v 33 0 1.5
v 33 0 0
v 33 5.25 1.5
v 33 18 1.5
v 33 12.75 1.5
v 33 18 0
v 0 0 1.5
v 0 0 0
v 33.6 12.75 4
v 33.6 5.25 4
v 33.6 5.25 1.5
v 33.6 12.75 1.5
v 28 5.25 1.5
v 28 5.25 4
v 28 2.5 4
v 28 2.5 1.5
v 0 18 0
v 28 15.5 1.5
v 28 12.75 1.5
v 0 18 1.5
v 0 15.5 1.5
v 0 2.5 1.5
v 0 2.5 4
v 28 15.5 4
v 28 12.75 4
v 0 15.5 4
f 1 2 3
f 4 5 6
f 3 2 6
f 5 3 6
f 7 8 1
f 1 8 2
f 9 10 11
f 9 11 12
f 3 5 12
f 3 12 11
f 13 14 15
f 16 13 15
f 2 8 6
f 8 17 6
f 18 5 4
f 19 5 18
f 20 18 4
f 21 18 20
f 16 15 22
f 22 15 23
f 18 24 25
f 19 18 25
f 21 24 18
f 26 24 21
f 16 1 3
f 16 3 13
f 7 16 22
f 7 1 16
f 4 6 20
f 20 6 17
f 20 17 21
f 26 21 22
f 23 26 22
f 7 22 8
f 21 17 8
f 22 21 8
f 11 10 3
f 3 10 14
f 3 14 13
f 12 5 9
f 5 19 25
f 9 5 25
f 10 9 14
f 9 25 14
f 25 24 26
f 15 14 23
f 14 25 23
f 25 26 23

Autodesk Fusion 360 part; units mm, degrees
sketch "スケッチ1" plane through (0, 0, 0) normal (0, 0, 1) x (1, 0, 0)
  line L0 (0, 0) -> (33, 0)
  line L1 (33, 0) -> (33, 18)
  line L2 (33, 18) -> (0, 18)
  line L3 (0, 18) -> (0, 0)
  dimension "d1" = 33
  dimension "d2" = 18
extrude "押し出し1" add sketch "スケッチ1" along normal blind 4
sketch "スケッチ2" plane through (0, 0, 4) normal (0, 0, 1) x (-1, 0, 0)
  line L0 (0, -18) -> (0, 0)
  line L1 (0, 0) -> (-33, 0)
  line L2 (-33, 0) -> (-33, -18)
  line L3 (-33, -18) -> (0, -18)
  line L4 (-33, -18) -> (-28, -18)
  line L5 (-28, -18) -> (-28, 0)
  line L6 (-28, 0) -> (-33, 0)
  line L7 (-33, 0) -> (-33, -18)
  line L8 (-28, -12.75) -> (-33, -12.75)
  line L9 (-33, -12.75) -> (-33, -5.25)
  line L10 (-33, -5.25) -> (-28, -5.25)
  line L11 (-28, -5.25) -> (-28, -12.75)
  line L12 (-31.75, -9) -> (-34.25, -9) construction
  line L13 (-34.25, -9) -> (-31.75, -9) construction
  line L14 (0, 0) -> (-28, 0)
  line L15 (-28, 0) -> (-28, -2.5)
  line L16 (-28, -2.5) -> (0, -2.5)
  line L17 (0, -2.5) -> (0, 0)
  line L18 (0, -18) -> (-28, -18)
  line L19 (-28, -18) -> (-28, -15.5)
  line L20 (-28, -15.5) -> (0, -15.5)
  line L21 (0, -15.5) -> (0, -18)
  dimension "d5" = 5
  dimension "d6" = 18
  dimension "d7" = 5
  dimension "d8" = 7.5
  dimension "d11" = 2.5
  dimension "d12" = 2.5
extrude "押し出し2" cut sketch "スケッチ2" against normal blind 2.5 contours L0 L3 L5 L18 L19 L20 L21 | L2 L3 L4 L5 L7 L8 L19 | L0 L1 L5 L14 L15 L16 L17 | L1 L2 L5 L6 L7 L10 L15
sketch "スケッチ3" plane through (33, 0, 0) normal (1, 0, 0) x (0, 1, 0)
  line L0 (5.25, 4) -> (5.25, 1.5)
  line L1 (5.25, 1.5) -> (0, 1.5)
  line L2 (0, 1.5) -> (0, 0)
  line L3 (0, 0) -> (18, 0)
  line L4 (18, 0) -> (18, 1.5)
  line L5 (18, 1.5) -> (12.75, 1.5)
  line L6 (12.75, 1.5) -> (12.75, 4)
  line L7 (12.75, 4) -> (5.25, 4)
  line L8 (12.75, 1.5) -> (5.25, 1.5)
  line L9 (5.25, 1.5) -> (5.25, 4)
  line L10 (5.25, 4) -> (12.75, 4)
  line L11 (12.75, 4) -> (12.75, 1.5)
extrude "押し出し3" add sketch "スケッチ3" along normal blind 0.6 contours L0 L6 L7 L8 L9 L10 L11
